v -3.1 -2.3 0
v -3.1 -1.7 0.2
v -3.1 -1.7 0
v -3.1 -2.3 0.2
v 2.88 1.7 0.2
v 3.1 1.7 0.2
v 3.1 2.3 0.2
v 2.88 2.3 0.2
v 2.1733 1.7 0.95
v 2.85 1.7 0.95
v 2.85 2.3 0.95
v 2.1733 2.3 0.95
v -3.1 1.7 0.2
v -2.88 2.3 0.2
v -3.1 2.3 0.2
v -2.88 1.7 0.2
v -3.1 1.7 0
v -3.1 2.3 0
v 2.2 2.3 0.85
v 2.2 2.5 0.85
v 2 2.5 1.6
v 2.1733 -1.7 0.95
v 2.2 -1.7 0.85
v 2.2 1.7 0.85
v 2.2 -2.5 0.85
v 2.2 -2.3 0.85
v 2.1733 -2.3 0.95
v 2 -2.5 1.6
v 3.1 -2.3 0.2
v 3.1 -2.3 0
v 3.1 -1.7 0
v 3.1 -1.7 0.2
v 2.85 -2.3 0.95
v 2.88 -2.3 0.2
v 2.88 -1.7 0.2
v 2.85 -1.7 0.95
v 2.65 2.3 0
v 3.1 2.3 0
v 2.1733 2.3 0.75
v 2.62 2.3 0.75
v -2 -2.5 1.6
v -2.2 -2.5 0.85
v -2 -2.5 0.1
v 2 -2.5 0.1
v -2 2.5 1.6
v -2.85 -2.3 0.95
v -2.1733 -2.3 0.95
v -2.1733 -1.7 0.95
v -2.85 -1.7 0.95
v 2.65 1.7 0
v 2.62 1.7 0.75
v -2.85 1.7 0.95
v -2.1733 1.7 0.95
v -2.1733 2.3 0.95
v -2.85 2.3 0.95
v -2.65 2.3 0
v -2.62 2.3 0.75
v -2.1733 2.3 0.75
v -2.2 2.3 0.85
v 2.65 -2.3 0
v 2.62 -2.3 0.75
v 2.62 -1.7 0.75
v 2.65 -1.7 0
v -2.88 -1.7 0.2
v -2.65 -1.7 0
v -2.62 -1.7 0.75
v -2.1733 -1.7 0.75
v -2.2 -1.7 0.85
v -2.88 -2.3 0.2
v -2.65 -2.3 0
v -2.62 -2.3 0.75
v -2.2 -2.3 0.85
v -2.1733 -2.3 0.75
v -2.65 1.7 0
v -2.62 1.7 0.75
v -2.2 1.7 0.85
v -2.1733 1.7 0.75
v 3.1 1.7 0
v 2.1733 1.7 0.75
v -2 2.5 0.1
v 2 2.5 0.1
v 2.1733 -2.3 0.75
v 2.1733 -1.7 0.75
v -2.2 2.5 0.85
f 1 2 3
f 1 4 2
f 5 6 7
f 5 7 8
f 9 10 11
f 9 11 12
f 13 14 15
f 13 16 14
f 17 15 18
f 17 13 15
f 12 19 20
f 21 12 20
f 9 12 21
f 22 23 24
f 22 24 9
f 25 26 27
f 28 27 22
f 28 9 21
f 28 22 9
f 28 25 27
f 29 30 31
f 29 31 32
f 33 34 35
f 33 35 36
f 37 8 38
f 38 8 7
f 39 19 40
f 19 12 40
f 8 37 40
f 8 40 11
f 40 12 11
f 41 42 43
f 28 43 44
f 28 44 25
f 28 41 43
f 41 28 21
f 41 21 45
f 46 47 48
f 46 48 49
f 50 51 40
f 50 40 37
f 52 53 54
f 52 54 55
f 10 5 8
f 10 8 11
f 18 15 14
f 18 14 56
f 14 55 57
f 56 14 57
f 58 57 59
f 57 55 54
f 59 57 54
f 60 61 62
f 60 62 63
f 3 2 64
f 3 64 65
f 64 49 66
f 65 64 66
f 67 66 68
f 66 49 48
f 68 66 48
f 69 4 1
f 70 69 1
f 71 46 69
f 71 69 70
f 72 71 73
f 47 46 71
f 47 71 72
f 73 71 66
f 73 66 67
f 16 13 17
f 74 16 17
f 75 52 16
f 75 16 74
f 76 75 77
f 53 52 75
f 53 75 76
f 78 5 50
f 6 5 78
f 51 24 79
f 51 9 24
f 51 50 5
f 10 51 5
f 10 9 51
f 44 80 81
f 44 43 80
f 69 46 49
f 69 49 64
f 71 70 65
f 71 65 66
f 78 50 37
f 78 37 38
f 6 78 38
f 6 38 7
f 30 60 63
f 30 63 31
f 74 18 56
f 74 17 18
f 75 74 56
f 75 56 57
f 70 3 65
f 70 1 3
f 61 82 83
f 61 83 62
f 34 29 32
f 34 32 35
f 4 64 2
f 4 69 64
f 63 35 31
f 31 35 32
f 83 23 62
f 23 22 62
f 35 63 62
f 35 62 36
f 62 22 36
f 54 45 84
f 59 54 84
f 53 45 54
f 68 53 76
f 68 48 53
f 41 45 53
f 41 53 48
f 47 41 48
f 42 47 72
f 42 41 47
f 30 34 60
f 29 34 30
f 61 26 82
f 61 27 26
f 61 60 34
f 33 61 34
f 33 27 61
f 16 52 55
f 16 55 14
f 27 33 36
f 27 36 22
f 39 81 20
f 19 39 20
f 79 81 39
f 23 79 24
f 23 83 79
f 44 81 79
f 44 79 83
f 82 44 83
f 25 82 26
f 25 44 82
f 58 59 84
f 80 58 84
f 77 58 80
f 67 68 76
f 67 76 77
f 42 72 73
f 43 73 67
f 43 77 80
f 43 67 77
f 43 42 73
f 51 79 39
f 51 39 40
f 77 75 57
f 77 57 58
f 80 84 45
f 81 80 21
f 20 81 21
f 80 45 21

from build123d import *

# Parameters (mm, degrees)
PAD_DEPTH    = 2.5
PAD002_DEPTH = 0.3
PAD001_DEPTH = 0.3


with BuildPart() as pad:
    # Sketch → Pad (new body, symmetric)
    with BuildSketch(Plane.XZ):
        Polygon((-2, 0.1), (2, 0.1), (2.2, 0.85), (2, 1.6), (-2, 1.6), (-2.2, 0.85), align=None)
    extrude(amount=PAD_DEPTH, both=True)


with BuildPart() as pad002:
    # Sketch002 → Pad002 (new body, symmetric)
    with BuildSketch(Plane.XZ.offset(2)):
        Polygon((-3.1, 0), (-2.65, 0), (-2.62, 0.75), (2.62, 0.75), (2.65, 0), (3.1, 0), (3.1, 0.2), (2.88, 0.2), (2.85, 0.95), (-2.85, 0.95), (-2.88, 0.2), (-3.1, 0.2), align=None)
    extrude(amount=PAD002_DEPTH, both=True)


with BuildPart() as diode_bridge_diotec_abs:
    # Sketch001 → Pad001 (new body, symmetric)
    with BuildSketch(Plane.XZ.offset(-2)):
        Polygon((-3.1, 0), (-2.65, 0), (-2.62, 0.75), (2.62, 0.75), (2.65, 0), (3.1, 0), (3.1, 0.2), (2.88, 0.2), (2.85, 0.95), (-2.85, 0.95), (-2.88, 0.2), (-3.1, 0.2), align=None)
    extrude(amount=PAD001_DEPTH, both=True)

    # Pad001_mp_cp: union Pad, Pad002
    add(pad.part)
    add(pad002.part)


solid = diode_bridge_diotec_abs.part
